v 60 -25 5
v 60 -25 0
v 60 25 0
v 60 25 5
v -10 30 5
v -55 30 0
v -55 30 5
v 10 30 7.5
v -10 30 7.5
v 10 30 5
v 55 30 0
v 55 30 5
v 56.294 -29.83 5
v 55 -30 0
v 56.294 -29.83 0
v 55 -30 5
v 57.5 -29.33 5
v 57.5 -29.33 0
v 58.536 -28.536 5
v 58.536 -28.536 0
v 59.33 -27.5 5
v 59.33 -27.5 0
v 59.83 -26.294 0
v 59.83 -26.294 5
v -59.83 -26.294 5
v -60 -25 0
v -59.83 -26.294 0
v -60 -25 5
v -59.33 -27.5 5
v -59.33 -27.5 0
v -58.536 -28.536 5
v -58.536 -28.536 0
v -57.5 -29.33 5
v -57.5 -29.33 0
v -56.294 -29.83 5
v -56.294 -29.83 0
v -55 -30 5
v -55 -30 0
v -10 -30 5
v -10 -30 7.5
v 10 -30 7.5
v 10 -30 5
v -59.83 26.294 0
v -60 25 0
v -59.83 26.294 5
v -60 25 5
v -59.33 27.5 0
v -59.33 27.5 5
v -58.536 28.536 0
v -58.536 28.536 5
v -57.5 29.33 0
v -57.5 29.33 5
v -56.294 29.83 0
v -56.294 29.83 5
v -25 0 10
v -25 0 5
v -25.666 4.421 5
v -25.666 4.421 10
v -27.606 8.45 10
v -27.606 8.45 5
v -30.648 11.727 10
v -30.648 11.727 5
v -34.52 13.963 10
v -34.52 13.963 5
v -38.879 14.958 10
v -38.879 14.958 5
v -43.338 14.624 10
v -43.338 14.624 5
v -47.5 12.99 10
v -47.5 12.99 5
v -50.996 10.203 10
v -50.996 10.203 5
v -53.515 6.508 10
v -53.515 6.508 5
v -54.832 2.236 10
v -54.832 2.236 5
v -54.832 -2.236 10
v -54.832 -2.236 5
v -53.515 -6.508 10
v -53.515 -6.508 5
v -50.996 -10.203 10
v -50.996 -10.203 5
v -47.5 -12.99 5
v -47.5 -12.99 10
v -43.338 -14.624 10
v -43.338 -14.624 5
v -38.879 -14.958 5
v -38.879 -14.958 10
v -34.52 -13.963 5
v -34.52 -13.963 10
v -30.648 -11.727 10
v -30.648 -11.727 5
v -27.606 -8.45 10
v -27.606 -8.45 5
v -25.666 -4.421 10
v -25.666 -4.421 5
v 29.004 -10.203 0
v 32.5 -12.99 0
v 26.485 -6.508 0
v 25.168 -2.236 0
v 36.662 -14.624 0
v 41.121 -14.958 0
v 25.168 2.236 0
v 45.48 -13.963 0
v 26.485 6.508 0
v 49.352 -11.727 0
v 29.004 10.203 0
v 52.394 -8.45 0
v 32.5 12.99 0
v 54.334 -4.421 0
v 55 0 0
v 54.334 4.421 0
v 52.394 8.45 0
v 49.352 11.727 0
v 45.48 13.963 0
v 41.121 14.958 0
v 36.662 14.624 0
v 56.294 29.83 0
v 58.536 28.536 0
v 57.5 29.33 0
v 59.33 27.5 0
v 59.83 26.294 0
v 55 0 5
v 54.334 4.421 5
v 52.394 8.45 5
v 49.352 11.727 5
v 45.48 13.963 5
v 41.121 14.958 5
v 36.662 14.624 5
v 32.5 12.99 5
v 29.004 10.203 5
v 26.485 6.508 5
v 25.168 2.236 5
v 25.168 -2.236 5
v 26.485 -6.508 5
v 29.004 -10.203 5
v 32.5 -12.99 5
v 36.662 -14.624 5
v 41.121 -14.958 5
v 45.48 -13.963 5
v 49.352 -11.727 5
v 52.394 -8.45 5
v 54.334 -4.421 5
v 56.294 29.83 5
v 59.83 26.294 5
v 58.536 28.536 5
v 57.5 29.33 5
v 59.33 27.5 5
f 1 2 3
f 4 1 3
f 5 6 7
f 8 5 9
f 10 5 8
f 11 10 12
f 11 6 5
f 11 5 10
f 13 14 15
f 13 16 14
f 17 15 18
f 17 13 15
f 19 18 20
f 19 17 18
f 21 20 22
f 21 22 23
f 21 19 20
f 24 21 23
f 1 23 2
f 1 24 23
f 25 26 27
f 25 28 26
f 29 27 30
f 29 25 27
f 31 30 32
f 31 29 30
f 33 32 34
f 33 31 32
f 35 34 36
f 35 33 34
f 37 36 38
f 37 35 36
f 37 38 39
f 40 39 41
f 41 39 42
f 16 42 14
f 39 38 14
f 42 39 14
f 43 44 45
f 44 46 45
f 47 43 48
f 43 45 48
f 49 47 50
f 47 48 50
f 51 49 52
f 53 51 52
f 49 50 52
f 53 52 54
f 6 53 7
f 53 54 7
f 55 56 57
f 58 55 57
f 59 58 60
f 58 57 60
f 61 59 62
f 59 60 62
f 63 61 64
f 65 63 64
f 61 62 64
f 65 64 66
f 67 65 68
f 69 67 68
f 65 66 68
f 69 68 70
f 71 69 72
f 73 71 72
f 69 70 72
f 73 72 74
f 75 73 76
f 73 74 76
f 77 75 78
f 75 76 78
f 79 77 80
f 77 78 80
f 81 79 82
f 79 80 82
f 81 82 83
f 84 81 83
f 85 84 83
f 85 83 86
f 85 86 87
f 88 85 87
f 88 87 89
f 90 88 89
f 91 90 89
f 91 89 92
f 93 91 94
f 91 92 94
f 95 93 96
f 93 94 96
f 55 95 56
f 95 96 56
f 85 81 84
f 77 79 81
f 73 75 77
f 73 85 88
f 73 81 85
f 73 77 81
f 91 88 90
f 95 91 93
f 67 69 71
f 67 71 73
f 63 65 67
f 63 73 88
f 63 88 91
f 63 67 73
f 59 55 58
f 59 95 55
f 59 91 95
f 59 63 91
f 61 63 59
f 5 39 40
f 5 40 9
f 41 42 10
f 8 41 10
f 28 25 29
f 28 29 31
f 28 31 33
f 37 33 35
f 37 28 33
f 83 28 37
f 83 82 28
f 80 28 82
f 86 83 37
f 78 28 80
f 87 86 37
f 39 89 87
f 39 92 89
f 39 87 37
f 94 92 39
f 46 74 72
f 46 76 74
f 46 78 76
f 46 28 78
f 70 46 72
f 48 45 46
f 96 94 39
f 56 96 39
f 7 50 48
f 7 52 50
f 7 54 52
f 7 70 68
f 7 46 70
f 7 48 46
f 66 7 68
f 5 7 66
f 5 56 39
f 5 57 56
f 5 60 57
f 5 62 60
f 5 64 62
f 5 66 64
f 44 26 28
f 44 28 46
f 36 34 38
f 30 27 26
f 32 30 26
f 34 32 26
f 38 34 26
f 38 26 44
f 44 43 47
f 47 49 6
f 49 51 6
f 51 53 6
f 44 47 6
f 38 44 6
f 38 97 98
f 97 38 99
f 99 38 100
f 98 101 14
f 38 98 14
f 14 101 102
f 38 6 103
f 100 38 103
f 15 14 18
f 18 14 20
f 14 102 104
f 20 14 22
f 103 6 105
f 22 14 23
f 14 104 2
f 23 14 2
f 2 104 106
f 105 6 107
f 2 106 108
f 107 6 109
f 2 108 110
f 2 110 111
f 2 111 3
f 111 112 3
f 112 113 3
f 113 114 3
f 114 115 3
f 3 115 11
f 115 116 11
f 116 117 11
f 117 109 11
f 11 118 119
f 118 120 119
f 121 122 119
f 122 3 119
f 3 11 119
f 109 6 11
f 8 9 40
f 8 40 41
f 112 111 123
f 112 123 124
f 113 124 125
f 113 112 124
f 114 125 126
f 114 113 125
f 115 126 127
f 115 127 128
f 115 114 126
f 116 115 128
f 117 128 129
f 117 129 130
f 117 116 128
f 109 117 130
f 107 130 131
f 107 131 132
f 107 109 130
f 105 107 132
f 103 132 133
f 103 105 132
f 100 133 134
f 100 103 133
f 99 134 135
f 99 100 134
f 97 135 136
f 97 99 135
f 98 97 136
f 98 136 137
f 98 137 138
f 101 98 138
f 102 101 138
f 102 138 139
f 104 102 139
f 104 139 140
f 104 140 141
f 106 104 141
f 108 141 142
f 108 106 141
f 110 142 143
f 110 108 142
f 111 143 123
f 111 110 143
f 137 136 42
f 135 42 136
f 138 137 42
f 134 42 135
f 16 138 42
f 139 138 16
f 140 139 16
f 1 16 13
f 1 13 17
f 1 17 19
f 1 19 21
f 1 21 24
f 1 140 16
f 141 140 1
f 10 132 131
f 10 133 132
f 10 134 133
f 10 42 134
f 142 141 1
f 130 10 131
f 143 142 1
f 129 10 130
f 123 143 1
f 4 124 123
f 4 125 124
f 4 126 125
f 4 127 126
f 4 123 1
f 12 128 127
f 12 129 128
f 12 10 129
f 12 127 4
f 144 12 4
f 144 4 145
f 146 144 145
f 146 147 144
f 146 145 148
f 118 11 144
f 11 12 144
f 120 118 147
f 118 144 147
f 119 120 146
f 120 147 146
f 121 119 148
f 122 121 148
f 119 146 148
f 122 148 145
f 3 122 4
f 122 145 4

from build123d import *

# Parameters (mm, degrees)
F0_W     = 120
F0_H     = 60
F0_R     = 15
F1_DEPTH = 5
F2_R     = 5
F3_R     = 15
F4_DEPTH = 5
F5_W     = 20
F5_H     = 60
F6_DEPTH = 2.5


with BuildPart() as f1:
    # F0 (on Top) → F1 (new body)
    with BuildSketch(Plane.XY):
        Rectangle(F0_W, F0_H)
        with Locations((40, 0)):
            Circle(F0_R, mode=Mode.SUBTRACT)
    extrude(amount=F1_DEPTH)

    # F2
    f2_edges = [f1.edges().sort_by_distance(p)[0] for p in [
        (60, 30, 2.5),
        (60, -30, 2.5),
        (-60, -30, 2.5),
        (-60, 30, 2.5),
    ]]
    fillet(f2_edges, radius=F2_R)

    # F3 (on face) → F4 (join)
    with BuildSketch(Plane.XY.offset(5)):
        with Locations((-40, 0)):
            Circle(F3_R)
    extrude(amount=F4_DEPTH)

    # F5 (on face) → F6 (join)
    with BuildSketch(Plane.XY.offset(5)):
        Rectangle(F5_W, F5_H)
    extrude(amount=F6_DEPTH)


solid = f1.part
